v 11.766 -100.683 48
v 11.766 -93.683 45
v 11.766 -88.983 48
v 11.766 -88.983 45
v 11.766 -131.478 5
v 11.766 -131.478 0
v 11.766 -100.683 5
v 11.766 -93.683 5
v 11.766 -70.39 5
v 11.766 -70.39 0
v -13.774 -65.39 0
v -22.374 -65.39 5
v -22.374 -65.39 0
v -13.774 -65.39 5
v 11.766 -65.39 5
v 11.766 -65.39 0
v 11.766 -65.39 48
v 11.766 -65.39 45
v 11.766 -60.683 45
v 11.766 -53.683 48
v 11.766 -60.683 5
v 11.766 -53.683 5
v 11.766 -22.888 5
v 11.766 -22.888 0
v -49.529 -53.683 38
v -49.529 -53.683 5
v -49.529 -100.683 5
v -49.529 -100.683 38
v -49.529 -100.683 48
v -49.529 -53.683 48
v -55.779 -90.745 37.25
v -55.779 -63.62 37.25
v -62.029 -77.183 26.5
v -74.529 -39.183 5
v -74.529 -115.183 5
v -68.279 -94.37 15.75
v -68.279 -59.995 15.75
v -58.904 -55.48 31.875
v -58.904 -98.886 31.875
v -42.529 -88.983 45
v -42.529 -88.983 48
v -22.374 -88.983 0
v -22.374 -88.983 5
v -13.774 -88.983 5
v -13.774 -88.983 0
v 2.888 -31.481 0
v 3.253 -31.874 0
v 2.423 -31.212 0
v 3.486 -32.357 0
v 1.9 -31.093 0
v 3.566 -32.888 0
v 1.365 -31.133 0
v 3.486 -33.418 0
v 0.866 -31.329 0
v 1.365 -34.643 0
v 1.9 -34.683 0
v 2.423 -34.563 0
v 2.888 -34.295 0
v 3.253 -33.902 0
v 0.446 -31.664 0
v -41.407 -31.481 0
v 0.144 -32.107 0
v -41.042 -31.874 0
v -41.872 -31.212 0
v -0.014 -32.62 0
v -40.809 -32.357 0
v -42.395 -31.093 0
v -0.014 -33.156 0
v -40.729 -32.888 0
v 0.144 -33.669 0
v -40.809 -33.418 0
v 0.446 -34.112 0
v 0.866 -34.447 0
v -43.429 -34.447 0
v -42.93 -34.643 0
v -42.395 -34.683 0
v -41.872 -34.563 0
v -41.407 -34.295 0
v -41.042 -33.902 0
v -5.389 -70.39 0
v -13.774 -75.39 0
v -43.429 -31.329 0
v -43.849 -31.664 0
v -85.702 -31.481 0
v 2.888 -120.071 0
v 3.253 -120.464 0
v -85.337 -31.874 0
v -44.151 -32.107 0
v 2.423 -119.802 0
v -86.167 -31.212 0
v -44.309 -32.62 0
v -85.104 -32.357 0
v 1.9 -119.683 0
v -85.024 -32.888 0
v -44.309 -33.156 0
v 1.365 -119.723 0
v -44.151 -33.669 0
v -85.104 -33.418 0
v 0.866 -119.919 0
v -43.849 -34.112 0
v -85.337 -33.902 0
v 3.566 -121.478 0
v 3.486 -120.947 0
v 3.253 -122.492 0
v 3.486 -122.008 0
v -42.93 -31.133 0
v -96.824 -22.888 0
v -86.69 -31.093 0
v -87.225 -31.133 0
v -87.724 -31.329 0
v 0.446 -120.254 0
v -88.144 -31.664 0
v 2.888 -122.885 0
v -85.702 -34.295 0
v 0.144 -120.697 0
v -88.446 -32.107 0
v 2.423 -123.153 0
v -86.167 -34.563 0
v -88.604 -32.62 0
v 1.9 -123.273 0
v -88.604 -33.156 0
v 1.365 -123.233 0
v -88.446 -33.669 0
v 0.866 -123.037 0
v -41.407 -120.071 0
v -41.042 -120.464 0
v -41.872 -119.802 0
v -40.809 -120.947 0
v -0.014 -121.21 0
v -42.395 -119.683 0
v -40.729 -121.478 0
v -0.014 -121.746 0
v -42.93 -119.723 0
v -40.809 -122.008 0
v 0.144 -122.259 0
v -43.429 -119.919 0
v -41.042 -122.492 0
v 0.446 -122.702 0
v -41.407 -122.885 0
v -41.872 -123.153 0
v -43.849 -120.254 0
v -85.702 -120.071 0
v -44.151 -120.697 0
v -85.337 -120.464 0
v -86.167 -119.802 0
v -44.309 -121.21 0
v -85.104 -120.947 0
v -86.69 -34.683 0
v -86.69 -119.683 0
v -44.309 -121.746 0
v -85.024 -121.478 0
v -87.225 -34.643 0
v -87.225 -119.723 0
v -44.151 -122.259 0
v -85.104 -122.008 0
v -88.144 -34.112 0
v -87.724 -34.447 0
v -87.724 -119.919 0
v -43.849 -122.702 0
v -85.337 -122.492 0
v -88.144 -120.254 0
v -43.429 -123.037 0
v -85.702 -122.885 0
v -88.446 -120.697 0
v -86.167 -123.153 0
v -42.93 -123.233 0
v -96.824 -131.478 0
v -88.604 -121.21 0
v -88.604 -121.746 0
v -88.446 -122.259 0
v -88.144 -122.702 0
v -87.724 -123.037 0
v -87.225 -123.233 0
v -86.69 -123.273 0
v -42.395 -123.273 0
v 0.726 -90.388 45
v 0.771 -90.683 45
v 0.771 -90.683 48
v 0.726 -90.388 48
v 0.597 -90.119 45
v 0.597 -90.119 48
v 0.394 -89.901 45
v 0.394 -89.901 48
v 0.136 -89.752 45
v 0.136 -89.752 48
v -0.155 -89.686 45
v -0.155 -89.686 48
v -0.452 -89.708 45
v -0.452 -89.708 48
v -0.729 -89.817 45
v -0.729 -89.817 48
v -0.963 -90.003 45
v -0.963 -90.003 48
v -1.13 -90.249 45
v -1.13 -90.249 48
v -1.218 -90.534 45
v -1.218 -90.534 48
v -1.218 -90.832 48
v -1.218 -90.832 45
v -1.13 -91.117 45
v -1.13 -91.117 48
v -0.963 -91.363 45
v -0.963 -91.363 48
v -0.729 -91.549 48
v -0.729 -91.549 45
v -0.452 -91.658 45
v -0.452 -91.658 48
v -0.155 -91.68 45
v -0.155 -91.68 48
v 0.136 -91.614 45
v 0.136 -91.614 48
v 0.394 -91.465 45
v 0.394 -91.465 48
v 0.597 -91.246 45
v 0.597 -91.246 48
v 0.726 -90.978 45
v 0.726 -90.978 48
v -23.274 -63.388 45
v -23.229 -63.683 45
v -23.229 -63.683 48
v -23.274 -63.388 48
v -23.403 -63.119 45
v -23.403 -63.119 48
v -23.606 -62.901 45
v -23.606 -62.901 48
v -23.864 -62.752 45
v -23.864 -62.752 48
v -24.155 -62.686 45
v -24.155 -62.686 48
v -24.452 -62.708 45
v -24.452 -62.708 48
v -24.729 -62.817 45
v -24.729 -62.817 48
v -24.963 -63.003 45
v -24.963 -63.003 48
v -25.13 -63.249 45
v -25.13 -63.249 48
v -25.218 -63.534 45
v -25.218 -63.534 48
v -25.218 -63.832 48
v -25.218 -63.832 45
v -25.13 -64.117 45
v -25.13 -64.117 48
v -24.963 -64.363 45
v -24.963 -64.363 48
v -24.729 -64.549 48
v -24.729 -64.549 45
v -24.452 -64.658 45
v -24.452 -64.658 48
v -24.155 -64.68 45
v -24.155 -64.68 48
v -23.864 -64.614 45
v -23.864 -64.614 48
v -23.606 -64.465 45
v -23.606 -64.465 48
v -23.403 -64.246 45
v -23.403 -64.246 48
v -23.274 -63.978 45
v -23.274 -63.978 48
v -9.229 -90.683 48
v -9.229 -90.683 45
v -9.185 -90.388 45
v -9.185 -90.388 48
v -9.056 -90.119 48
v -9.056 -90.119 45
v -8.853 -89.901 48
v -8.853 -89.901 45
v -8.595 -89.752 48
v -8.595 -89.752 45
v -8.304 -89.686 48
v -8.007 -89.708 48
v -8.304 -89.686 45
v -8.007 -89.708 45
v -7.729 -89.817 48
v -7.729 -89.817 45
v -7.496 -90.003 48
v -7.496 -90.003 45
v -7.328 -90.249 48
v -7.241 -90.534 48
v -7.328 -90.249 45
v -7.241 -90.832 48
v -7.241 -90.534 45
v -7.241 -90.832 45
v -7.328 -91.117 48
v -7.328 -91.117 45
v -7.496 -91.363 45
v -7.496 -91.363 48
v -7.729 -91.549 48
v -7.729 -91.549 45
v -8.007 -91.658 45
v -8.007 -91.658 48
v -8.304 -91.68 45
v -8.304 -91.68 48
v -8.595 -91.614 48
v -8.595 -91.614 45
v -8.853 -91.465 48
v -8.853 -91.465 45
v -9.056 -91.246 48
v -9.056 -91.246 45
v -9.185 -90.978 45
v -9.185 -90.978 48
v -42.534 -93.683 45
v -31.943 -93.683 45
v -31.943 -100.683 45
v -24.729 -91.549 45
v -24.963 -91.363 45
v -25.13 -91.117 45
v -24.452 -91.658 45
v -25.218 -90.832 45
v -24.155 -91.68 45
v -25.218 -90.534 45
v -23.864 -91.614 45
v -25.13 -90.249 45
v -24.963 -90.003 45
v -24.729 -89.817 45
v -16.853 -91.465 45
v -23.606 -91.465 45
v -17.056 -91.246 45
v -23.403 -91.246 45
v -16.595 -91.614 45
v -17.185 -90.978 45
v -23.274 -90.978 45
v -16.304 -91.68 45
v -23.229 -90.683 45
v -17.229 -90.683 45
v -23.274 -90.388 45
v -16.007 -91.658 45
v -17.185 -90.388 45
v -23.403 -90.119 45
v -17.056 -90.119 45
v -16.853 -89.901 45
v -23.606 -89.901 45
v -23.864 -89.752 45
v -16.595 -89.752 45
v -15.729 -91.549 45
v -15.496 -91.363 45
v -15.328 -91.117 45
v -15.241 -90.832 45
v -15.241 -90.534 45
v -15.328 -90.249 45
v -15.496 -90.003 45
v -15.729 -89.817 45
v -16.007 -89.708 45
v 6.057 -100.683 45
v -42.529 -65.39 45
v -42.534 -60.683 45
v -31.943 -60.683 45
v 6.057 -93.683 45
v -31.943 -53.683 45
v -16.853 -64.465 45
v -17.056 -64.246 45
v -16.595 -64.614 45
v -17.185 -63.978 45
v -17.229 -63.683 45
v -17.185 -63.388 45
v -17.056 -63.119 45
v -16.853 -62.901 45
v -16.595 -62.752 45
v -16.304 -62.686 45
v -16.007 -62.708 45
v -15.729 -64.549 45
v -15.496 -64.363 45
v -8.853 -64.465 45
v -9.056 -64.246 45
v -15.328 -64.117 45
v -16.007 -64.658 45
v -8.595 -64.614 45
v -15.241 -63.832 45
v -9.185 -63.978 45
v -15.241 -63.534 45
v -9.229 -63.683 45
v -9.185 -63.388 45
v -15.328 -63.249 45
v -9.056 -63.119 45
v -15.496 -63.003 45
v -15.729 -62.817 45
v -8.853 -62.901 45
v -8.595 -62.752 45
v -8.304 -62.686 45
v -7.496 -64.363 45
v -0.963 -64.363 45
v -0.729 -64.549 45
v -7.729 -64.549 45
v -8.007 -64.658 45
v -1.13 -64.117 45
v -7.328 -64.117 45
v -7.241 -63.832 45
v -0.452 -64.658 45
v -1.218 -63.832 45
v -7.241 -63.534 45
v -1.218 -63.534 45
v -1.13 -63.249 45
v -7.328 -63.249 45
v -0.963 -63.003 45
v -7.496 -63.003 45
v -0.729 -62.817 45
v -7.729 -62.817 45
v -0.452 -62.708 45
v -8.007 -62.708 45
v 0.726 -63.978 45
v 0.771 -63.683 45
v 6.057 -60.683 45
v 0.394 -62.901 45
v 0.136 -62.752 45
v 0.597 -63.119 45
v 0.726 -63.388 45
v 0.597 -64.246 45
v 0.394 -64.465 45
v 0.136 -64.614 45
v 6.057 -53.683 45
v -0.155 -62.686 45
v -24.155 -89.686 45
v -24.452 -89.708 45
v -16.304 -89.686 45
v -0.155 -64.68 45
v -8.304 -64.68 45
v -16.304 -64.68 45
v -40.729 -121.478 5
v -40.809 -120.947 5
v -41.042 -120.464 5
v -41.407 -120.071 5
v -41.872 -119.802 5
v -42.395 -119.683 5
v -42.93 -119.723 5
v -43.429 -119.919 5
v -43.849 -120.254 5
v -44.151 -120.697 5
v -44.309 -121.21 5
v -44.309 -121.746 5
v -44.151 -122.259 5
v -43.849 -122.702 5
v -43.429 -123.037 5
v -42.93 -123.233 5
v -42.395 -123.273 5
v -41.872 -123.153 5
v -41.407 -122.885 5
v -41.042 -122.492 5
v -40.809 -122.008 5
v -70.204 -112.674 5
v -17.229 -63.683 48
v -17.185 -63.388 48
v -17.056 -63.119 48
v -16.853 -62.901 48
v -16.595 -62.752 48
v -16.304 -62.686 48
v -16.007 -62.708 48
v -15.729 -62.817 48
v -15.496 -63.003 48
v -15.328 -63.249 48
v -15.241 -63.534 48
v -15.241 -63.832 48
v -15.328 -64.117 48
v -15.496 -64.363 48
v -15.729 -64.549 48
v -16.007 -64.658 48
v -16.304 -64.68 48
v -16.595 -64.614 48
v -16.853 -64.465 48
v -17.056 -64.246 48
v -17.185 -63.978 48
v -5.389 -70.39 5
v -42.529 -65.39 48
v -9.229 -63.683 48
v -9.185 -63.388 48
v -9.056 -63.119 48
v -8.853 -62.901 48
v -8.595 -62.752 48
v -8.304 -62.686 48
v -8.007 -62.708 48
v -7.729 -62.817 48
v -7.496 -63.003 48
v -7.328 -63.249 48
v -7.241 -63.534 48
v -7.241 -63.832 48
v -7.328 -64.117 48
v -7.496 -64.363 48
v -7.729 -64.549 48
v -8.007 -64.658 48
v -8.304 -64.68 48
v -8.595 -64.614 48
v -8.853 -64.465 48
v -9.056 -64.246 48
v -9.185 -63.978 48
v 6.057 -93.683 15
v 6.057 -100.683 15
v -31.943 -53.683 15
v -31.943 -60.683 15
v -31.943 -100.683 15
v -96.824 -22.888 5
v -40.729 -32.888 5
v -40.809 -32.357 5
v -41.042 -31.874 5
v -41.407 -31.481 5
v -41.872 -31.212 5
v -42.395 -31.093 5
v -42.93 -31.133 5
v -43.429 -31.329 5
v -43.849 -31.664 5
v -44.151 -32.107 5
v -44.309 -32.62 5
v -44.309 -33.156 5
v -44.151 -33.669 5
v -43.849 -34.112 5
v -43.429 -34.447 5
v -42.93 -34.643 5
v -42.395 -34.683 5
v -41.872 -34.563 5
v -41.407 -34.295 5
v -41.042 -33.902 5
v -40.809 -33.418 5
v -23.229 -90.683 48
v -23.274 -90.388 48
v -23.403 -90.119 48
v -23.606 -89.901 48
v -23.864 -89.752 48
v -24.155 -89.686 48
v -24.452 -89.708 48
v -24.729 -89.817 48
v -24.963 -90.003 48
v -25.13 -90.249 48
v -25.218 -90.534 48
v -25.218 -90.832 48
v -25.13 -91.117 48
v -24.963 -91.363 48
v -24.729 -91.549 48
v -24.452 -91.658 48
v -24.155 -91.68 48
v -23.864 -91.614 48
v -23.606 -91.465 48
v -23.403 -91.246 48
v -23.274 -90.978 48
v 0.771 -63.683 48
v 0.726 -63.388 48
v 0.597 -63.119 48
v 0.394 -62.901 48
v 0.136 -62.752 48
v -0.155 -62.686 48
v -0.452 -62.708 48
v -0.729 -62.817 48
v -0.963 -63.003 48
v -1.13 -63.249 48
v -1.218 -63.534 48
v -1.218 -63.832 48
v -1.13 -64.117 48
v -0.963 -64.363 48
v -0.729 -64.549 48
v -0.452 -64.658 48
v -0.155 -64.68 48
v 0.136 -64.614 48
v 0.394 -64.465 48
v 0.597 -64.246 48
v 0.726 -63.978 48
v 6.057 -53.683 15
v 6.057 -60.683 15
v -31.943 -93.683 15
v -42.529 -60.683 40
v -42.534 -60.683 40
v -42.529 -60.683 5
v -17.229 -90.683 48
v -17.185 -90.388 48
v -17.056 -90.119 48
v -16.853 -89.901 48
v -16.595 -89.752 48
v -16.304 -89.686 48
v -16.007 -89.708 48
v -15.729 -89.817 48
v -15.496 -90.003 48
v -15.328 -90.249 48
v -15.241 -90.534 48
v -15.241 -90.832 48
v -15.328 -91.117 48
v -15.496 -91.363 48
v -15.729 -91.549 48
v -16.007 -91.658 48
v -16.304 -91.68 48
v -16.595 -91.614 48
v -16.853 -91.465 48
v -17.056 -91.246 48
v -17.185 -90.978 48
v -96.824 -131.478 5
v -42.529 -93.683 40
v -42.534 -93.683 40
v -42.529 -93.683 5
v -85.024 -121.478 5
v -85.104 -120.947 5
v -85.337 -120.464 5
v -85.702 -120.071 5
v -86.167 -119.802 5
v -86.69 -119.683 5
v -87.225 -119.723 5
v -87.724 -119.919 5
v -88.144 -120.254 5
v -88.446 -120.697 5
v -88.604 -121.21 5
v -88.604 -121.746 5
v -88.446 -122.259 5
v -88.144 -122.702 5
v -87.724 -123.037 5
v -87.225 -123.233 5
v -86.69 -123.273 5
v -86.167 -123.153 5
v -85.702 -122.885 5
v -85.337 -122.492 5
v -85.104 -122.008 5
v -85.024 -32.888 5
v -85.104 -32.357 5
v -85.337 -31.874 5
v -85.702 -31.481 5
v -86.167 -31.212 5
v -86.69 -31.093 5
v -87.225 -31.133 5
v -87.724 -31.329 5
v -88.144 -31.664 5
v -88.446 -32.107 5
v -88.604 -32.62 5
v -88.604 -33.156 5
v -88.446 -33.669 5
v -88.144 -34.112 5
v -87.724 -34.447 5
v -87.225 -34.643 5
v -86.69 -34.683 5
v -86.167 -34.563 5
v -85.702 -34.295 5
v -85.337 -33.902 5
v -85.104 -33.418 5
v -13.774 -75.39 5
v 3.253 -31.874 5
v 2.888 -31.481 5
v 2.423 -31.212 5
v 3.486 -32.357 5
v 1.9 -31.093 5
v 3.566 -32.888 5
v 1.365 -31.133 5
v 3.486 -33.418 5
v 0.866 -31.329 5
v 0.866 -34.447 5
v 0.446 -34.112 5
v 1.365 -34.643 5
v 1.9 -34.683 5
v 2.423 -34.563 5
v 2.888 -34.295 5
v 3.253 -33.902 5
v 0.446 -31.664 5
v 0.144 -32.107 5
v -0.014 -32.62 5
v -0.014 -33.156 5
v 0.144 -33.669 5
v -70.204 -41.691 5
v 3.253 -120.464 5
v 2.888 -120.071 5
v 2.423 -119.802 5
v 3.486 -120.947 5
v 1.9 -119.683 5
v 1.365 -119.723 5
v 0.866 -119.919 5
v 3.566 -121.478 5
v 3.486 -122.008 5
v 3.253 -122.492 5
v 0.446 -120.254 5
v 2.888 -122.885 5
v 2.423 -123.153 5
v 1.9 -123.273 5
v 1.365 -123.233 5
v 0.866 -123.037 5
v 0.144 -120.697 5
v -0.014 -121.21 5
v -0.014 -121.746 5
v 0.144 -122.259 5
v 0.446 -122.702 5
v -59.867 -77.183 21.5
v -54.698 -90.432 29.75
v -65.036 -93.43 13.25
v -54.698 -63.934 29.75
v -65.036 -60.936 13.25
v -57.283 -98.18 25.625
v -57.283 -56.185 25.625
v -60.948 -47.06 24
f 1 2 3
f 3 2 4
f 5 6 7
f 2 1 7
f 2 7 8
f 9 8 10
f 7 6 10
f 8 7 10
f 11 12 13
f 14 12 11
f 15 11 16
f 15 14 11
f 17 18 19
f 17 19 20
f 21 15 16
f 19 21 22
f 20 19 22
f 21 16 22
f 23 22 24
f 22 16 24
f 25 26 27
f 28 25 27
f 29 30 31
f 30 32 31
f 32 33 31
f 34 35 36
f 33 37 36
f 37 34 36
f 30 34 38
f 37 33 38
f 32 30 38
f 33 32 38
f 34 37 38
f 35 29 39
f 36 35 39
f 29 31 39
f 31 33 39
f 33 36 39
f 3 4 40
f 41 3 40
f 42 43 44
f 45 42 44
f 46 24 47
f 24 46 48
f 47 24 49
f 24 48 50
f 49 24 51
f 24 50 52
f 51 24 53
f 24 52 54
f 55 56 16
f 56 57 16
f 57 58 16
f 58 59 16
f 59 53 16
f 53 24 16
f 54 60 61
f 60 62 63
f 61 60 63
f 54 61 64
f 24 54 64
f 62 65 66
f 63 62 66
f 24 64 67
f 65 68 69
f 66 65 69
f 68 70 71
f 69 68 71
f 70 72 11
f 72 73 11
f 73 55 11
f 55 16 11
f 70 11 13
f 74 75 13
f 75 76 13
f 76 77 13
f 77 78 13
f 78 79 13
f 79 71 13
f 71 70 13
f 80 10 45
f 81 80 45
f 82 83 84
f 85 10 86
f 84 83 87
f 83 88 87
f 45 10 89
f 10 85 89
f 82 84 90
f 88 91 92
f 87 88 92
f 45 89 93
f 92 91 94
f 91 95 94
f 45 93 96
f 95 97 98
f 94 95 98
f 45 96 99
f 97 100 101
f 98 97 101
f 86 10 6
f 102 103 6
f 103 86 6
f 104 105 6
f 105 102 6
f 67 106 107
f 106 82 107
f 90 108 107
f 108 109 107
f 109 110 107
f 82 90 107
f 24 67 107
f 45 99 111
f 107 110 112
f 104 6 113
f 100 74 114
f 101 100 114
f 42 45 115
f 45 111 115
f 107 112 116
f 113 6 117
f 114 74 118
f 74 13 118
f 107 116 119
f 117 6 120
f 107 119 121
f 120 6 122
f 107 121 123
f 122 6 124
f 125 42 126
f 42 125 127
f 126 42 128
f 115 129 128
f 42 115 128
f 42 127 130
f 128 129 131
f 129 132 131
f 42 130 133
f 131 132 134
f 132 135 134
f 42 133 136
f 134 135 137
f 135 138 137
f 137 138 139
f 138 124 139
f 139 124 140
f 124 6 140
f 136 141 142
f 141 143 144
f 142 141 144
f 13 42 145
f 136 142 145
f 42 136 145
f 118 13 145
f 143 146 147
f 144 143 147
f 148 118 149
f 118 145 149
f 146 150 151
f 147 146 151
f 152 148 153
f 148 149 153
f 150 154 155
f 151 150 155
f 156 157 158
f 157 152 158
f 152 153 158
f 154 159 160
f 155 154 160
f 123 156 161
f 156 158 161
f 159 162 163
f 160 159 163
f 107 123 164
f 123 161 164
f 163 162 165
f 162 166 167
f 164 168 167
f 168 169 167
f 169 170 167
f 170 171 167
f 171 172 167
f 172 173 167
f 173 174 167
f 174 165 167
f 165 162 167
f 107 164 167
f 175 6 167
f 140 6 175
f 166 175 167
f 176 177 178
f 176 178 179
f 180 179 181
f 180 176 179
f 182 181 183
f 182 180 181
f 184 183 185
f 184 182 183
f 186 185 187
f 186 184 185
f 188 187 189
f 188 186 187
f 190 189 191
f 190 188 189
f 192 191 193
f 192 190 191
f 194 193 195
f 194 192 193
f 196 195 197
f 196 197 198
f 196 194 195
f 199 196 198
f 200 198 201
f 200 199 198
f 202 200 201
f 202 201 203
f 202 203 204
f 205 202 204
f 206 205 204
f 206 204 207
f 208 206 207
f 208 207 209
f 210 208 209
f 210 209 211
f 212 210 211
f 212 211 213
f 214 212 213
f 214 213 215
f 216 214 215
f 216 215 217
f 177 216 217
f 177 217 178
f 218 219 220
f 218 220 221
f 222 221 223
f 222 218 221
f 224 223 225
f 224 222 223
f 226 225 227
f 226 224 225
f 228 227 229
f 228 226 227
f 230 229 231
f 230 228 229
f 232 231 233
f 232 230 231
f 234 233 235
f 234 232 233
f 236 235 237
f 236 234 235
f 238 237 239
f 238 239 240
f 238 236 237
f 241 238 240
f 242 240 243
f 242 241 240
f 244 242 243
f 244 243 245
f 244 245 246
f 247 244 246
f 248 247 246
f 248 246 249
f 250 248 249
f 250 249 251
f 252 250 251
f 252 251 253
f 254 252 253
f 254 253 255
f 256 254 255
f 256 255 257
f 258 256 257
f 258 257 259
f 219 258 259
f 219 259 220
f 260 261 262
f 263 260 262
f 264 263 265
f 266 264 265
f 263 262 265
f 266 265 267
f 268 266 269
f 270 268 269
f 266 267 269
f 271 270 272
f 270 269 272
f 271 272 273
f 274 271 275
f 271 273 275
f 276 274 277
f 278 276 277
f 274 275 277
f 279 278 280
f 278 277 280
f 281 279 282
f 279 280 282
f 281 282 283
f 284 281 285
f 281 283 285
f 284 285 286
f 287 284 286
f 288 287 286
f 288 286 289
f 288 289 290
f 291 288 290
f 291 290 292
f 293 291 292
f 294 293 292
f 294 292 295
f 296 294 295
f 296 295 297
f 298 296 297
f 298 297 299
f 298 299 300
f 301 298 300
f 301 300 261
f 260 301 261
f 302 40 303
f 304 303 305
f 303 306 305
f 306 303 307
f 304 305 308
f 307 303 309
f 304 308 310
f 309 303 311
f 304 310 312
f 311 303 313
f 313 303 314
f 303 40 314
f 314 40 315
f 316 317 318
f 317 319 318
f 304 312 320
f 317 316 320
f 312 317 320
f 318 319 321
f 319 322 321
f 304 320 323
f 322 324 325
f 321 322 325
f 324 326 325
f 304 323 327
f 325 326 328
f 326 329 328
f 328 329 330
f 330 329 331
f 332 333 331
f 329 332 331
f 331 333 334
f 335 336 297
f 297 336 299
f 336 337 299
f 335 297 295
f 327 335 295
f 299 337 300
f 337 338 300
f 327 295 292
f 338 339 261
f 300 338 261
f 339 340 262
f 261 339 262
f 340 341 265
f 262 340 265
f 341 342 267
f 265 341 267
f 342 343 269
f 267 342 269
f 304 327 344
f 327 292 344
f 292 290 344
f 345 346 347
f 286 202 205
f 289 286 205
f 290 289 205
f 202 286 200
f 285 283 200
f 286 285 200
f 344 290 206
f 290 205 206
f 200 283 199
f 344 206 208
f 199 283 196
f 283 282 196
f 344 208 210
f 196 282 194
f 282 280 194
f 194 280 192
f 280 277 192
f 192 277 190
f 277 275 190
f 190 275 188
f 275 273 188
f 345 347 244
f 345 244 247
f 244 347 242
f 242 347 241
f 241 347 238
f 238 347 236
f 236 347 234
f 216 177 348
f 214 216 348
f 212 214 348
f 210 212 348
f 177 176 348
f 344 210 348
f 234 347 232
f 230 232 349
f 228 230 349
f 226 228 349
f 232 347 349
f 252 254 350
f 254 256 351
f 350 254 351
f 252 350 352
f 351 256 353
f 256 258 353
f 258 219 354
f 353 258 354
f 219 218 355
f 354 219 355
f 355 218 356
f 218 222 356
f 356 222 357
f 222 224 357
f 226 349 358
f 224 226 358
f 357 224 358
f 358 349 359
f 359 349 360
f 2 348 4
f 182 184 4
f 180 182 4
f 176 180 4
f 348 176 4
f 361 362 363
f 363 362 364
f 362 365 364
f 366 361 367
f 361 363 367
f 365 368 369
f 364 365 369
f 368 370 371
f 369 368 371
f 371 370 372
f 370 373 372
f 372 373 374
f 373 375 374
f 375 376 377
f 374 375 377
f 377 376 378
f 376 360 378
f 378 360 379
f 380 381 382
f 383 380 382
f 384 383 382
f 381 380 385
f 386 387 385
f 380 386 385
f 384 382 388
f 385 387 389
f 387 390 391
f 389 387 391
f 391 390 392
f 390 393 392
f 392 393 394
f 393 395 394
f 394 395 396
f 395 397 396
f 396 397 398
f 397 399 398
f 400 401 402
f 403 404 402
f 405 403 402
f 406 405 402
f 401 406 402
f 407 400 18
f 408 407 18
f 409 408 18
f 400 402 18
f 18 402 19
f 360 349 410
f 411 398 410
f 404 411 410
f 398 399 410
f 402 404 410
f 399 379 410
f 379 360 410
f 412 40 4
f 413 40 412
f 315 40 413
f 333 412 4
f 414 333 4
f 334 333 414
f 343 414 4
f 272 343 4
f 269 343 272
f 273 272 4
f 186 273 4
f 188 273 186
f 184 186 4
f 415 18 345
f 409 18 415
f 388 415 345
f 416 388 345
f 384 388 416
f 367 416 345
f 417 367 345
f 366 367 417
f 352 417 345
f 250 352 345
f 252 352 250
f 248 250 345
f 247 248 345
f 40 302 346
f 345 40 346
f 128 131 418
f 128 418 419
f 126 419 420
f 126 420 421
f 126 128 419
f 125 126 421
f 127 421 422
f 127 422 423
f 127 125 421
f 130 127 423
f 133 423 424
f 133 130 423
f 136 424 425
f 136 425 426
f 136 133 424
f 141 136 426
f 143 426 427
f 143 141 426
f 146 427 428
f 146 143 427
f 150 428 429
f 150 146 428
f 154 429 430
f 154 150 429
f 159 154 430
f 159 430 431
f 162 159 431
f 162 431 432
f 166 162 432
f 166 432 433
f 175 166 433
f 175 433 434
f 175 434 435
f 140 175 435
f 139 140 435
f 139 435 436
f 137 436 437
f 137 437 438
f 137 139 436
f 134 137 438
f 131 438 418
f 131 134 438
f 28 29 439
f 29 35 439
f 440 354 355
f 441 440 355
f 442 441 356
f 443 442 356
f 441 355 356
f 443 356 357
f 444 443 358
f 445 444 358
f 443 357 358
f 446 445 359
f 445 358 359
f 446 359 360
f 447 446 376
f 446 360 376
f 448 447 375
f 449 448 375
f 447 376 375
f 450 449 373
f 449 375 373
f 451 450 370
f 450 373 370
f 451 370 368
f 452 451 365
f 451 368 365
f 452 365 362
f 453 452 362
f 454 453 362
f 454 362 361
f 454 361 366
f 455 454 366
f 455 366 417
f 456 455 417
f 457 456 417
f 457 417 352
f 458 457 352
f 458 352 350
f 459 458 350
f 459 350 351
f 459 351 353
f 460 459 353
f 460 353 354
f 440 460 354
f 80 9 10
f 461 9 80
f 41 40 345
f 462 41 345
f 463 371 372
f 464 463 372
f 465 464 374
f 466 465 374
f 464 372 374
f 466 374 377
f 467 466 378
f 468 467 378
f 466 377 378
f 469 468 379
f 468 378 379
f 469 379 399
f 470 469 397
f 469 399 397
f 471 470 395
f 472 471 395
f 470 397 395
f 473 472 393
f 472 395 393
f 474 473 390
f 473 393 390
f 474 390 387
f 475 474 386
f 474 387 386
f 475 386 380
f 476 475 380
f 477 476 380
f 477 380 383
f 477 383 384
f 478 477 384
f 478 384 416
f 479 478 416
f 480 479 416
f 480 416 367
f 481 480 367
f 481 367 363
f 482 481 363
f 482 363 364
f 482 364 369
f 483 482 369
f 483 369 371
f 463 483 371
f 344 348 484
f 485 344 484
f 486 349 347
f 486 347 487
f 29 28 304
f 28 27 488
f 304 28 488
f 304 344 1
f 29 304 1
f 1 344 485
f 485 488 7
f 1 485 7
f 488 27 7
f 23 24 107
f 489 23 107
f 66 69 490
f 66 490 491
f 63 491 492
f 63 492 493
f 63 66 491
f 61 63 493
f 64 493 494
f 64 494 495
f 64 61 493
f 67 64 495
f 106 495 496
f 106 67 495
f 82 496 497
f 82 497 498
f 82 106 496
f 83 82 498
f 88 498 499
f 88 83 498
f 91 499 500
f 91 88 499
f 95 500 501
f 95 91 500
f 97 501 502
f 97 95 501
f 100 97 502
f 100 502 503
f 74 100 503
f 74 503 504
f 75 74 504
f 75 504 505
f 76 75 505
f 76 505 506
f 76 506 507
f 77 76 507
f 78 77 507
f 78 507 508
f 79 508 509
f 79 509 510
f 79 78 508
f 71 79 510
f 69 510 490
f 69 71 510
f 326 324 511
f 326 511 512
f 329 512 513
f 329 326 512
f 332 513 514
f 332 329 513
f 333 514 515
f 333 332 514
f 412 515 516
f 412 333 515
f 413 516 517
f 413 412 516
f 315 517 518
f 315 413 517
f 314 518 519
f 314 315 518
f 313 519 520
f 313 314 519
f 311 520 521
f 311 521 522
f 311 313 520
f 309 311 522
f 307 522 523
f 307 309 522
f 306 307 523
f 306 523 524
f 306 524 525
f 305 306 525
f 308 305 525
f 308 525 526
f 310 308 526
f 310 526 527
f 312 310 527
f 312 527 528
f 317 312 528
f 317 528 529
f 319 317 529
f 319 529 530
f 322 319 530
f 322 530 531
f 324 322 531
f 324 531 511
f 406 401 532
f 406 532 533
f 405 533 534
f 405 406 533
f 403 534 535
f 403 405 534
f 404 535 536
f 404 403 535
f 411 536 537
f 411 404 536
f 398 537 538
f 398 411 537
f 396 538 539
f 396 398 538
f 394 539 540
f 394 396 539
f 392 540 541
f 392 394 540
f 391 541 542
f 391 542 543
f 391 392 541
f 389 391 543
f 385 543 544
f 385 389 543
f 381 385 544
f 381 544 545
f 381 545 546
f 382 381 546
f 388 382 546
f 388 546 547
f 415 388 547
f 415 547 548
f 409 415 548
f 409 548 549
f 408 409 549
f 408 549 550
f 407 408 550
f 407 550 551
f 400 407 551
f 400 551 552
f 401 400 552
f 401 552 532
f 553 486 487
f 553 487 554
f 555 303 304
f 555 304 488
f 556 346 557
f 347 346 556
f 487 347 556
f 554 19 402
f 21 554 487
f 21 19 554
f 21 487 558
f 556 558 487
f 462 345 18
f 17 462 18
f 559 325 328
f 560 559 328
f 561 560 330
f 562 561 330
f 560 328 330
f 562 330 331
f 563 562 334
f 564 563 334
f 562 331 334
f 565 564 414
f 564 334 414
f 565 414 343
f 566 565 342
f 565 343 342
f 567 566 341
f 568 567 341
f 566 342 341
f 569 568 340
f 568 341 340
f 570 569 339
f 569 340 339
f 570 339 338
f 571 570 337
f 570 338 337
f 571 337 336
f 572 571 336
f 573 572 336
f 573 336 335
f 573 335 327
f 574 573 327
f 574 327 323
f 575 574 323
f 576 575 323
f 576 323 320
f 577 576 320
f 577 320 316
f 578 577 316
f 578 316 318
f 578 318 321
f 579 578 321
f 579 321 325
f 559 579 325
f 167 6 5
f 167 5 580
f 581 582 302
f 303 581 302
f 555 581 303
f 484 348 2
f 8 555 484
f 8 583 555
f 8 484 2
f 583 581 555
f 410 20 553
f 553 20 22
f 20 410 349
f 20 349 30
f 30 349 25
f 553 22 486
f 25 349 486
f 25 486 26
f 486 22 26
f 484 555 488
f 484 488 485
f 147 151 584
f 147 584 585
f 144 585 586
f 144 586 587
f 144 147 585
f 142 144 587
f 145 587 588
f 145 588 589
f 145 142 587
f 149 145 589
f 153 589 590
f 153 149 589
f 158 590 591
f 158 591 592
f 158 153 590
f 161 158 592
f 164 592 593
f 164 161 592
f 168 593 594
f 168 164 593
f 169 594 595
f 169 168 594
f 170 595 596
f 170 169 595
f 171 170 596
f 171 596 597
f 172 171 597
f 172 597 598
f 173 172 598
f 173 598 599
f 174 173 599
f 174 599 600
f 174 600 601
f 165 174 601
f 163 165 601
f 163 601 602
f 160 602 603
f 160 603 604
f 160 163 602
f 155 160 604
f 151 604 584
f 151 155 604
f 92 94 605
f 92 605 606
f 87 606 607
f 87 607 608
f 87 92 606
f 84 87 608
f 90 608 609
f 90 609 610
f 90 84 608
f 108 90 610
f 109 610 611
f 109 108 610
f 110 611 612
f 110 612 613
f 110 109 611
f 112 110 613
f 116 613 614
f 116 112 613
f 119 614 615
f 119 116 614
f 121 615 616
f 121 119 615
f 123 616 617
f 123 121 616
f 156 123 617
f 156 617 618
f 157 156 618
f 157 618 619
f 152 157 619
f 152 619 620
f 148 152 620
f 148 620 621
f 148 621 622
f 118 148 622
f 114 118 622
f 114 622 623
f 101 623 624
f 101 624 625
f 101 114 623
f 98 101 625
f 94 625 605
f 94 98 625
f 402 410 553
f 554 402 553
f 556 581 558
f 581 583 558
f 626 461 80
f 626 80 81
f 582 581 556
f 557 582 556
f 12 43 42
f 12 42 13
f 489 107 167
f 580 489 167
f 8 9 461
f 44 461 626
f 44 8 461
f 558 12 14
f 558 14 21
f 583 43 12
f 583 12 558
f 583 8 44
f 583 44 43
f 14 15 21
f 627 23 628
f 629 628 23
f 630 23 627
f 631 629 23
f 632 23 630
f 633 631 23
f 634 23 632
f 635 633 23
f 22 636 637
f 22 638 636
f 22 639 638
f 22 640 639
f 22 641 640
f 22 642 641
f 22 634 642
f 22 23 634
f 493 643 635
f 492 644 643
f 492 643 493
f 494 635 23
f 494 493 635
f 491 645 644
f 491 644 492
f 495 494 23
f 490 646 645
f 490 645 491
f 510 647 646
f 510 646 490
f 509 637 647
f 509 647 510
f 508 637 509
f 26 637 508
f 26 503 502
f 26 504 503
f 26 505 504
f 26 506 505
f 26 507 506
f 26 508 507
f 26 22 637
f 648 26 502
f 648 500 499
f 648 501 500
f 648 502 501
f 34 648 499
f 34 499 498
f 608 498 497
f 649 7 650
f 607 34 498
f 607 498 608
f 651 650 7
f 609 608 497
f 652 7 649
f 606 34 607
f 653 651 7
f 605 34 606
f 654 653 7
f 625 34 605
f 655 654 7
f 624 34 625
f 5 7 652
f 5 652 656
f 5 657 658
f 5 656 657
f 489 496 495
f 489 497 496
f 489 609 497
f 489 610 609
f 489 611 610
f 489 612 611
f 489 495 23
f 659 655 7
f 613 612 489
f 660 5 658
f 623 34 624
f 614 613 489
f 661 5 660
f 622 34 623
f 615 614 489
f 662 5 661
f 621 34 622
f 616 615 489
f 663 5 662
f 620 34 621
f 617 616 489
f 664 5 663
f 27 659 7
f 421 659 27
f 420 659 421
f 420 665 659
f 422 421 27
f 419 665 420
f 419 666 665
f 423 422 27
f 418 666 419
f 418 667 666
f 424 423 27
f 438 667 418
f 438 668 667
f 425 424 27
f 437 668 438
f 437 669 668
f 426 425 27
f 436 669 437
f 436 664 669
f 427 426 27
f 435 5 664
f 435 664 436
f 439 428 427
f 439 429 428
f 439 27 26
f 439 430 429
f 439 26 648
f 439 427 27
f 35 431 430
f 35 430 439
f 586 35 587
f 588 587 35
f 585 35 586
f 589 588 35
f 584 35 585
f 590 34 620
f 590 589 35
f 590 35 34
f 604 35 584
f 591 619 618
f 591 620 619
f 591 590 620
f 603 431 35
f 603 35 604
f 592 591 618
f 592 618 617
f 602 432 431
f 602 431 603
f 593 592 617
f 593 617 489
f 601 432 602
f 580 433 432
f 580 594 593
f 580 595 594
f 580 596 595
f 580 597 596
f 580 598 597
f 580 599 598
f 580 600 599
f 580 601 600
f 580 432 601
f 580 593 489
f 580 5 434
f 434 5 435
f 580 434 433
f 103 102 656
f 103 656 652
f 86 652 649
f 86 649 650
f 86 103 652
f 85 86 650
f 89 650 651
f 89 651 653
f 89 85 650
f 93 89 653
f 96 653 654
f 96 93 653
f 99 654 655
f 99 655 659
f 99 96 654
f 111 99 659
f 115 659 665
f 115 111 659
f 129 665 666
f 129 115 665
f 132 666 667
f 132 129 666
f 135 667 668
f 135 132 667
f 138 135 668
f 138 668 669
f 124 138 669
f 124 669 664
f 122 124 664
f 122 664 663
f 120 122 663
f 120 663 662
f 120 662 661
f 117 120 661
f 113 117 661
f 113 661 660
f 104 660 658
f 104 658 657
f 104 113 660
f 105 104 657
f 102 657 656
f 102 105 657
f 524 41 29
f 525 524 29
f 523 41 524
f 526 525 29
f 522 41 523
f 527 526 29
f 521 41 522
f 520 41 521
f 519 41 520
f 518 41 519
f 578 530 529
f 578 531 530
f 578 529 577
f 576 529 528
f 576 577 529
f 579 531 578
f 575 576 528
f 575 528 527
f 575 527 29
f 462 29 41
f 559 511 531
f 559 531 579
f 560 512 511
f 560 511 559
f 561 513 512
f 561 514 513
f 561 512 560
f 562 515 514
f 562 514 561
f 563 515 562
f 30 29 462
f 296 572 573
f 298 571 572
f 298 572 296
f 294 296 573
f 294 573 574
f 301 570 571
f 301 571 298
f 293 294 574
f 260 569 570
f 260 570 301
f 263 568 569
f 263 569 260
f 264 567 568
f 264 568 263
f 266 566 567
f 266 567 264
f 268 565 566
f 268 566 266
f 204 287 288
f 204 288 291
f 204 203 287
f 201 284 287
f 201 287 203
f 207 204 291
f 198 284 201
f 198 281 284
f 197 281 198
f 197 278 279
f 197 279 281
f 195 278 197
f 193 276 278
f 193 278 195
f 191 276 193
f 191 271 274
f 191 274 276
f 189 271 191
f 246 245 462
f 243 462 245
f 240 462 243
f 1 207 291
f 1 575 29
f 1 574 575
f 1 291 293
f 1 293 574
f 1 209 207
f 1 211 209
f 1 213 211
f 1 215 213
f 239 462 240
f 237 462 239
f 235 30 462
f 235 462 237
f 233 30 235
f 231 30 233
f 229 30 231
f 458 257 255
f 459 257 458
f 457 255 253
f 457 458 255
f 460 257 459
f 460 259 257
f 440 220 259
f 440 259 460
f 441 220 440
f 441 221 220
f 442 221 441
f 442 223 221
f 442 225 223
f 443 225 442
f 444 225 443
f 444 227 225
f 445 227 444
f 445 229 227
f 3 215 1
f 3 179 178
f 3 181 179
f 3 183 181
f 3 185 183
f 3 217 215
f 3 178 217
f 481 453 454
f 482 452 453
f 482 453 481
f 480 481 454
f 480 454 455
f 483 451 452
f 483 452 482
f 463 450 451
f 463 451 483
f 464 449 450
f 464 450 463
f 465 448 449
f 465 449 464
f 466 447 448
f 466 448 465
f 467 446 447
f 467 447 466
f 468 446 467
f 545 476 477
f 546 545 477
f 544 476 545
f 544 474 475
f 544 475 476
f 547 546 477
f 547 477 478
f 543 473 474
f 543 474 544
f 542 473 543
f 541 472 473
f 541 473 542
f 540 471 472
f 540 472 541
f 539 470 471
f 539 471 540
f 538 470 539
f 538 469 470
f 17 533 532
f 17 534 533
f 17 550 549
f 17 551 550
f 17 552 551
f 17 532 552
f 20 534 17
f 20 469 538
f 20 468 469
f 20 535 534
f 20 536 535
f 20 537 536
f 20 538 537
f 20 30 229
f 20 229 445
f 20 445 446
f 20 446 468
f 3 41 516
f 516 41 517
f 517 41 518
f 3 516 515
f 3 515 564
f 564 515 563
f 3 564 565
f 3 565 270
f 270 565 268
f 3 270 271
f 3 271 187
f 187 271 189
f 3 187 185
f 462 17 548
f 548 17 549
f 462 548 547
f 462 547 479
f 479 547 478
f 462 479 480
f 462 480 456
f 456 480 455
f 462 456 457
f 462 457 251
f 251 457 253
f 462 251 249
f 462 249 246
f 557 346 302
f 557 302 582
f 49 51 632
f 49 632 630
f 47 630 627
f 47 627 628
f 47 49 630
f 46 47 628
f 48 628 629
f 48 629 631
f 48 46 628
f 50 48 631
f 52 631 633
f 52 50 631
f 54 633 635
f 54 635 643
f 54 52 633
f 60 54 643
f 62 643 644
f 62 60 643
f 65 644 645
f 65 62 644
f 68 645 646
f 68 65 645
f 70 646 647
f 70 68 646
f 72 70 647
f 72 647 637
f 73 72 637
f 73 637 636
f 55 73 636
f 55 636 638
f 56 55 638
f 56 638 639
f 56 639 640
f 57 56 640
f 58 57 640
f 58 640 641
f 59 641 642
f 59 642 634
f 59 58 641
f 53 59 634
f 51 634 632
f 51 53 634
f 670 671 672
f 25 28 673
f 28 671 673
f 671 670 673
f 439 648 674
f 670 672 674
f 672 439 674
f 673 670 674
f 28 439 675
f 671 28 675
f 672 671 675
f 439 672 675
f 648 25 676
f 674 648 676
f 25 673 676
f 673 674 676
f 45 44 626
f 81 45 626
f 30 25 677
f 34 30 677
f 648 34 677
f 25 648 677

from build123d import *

# Parameters (mm, degrees)
ESQUISSE1_R             = 1.8
BOSS_EXTRU_1_DEPTH      = 5
BOSS_EXTRU_2_DEPTH      = 35
ESQUISSE3_R             = 1
BOSS_EXTRU_3_DEPTH      = 8
ESQUISSE4_W             = 8.59995714
ESQUISSE4_H             = 23.592650329
ENL_V_MAT_EXTRU_1_DEPTH = 5
ESQUISSE8_W             = 5
ESQUISSE8_H             = 33
ENL_V_MAT_EXTRU_2_DEPTH = 54.3
ESQUISSE9_W             = 38
ESQUISSE9_H             = 30
ENL_V_MAT_EXTRU_3_DEPTH = 134.157940401
ENL_V_MAT_EXTRU_4_DEPTH = 74.3


with BuildPart() as part:
    # Esquisse1 → Boss.-Extru.1 (new body)
    with BuildSketch(Plane(origin=(0, 0, 0), x_dir=(-1, 0, 0), z_dir=(0, 0, 1))):
        Polygon((96.824454852, 121.477817805), (96.824454852, 131.477817805), (-1.765545148, 131.477817805), (-11.765545148, 131.477817805), (-11.765545148, 22.887817805), (-1.765545148, 22.887817805), (42.529454852, 22.887817805), (86.824454852, 22.887817805), (96.824454852, 22.887817805), align=None)
        with BuildLine():
            ThreePointArc((0.034454852, 32.887817805), (-0.492752942, 31.615025599), (-1.765545148, 31.087817805))
            ThreePointArc((-1.765545148, 31.087817805), (-3.038337355, 34.160610011), (0.034454852, 32.887817805))
        make_face(mode=Mode.SUBTRACT)
        with BuildLine():
            ThreePointArc((44.329454852, 32.887817805), (43.802247058, 31.615025599), (42.529454852, 31.087817805))
            ThreePointArc((42.529454852, 31.087817805), (40.729454852, 32.887817805), (42.529454852, 34.687817805))
            ThreePointArc((42.529454852, 34.687817805), (43.802247058, 34.160610011), (44.329454852, 32.887817805))
        make_face(mode=Mode.SUBTRACT)
        with BuildLine():
            ThreePointArc((88.624454852, 32.887817805), (88.097247058, 31.615025599), (86.824454852, 31.087817805))
            ThreePointArc((86.824454852, 31.087817805), (85.551662645, 34.160610011), (88.624454852, 32.887817805))
        make_face(mode=Mode.SUBTRACT)
        with BuildLine():
            ThreePointArc((0.034454852, 121.477817805), (-3.038337355, 120.205025599), (-1.765545148, 123.277817805))
            ThreePointArc((-1.765545148, 123.277817805), (-0.492752942, 122.750610011), (0.034454852, 121.477817805))
        make_face(mode=Mode.SUBTRACT)
        with BuildLine():
            ThreePointArc((44.329454852, 121.477817805), (43.802247058, 120.205025599), (42.529454852, 119.677817805))
            ThreePointArc((42.529454852, 119.677817805), (41.256662645, 122.750610011), (44.329454852, 121.477817805))
        make_face(mode=Mode.SUBTRACT)
        with Locations((86.824454852, 121.477817805)):
            Circle(ESQUISSE1_R, mode=Mode.SUBTRACT)
    extrude(amount=BOSS_EXTRU_1_DEPTH)

    # Esquisse2 → Boss.-Extru.2 (add)
    with BuildSketch(Plane.XY.offset(5)):
        Polygon((11.765545148, -53.682817805), (-49.529454852, -53.682817805), (-49.529454852, -100.682817805), (11.765545148, -100.682817805), (11.765545148, -93.682817805), (-42.529454852, -93.682817805), (-42.529454852, -60.682817805), (11.765545148, -60.682817805), align=None)
    extrude(amount=BOSS_EXTRU_2_DEPTH)

    # Esquisse3 → Boss.-Extru.3 (add)
    with BuildSketch(Plane.XY.offset(40)):
        Polygon((-42.529454852, -65.390167476), (11.765545148, -65.390167476), (11.765545148, -53.682817805), (-49.529454852, -53.682817805), (-49.529454852, -100.682817805), (11.765545148, -100.682817805), (11.765545148, -88.982817805), (-42.529454852, -88.982817805), align=None)
        with Locations((-24.229454852, -63.682817805)):
            Circle(ESQUISSE3_R, mode=Mode.SUBTRACT)
        with BuildLine():
            ThreePointArc((-15.229454852, -63.682817805), (-16.229454852, -64.682817805), (-17.229454852, -63.682817805))
            ThreePointArc((-17.229454852, -63.682817805), (-16.229454852, -62.682817805), (-15.229454852, -63.682817805))
        make_face(mode=Mode.SUBTRACT)
        with BuildLine():
            ThreePointArc((-7.229454852, -63.682817805), (-8.229454852, -64.682817805), (-9.229454852, -63.682817805))
            ThreePointArc((-9.229454852, -63.682817805), (-8.229454852, -62.682817805), (-7.229454852, -63.682817805))
        make_face(mode=Mode.SUBTRACT)
        with Locations((-0.229454852, -63.682817805)):
            Circle(ESQUISSE3_R, mode=Mode.SUBTRACT)
        with Locations((-24.229454852, -90.682817805)):
            Circle(ESQUISSE3_R, mode=Mode.SUBTRACT)
        with BuildLine():
            ThreePointArc((-15.229454852, -90.682817805), (-16.229454852, -91.682817805), (-17.229454852, -90.682817805))
            ThreePointArc((-17.229454852, -90.682817805), (-16.229454852, -89.682817805), (-15.229454852, -90.682817805))
        make_face(mode=Mode.SUBTRACT)
        with BuildLine():
            ThreePointArc((-7.229454852, -90.682817805), (-8.229454852, -91.682817805), (-9.229454852, -90.682817805))
            ThreePointArc((-9.229454852, -90.682817805), (-8.229454852, -89.682817805), (-7.229454852, -90.682817805))
        make_face(mode=Mode.SUBTRACT)
        with Locations((-0.229454852, -90.682817805)):
            Circle(ESQUISSE3_R, mode=Mode.SUBTRACT)
    extrude(amount=BOSS_EXTRU_3_DEPTH)

    # Esquisse4 → Enlèv. mat.-Extru.1 (cut)
    with BuildSketch(Plane.XY.offset(5)):
        with Locations((-18.074099951, -77.186492641)):
            Rectangle(ESQUISSE4_W, ESQUISSE4_H)
    extrude(amount=-ENL_V_MAT_EXTRU_1_DEPTH, mode=Mode.SUBTRACT)

    # Esquisse5 → Lissage3 section 0
    with BuildSketch(Plane.ZY.offset(49.529454852)):
        with BuildLine():
            Line((48, -100.682817805), (38, -100.682817805))
            Line((38, -100.682817805), (38, -53.682817805))
            Line((38, -53.682817805), (48, -53.682817805))
            Line((48, -53.682817805), (48, -100.682817805))
        make_face()
    # Esquisse6 → Lissage3 section 1
    with BuildSketch(Plane.XY.offset(5)):
        with BuildLine():
            Line((-74.529454852, -115.182817805), (-74.529454852, -39.182817805))
            Line((-74.529454852, -39.182817805), (-70.204298905, -41.691408254))
            Line((-70.204298905, -41.691408254), (-70.204298905, -112.674227356))
            Line((-70.204298905, -112.674227356), (-74.529454852, -115.182817805))
        make_face()
    loft()

    # Esquisse8 → Enlèv. mat.-Extru.2 (cut)
    with BuildSketch(Plane(origin=(11.765545148, 0, 0), x_dir=(0, 0, -1), z_dir=(1, 0, 0))):
        with Locations((-42.5, -77.182817805)):
            Rectangle(ESQUISSE8_W, ESQUISSE8_H)
    extrude(amount=-ENL_V_MAT_EXTRU_2_DEPTH, mode=Mode.SUBTRACT)

    # Esquisse9 → Enlèv. mat.-Extru.3 (cut, through all)
    with BuildSketch(Plane(origin=(0, -53.682817805, 0), x_dir=(1, 0, 0), z_dir=(0, 1, 0))):
        with Locations((-12.943096448, -30)):
            Rectangle(ESQUISSE9_W, ESQUISSE9_H)
    extrude(amount=-ENL_V_MAT_EXTRU_3_DEPTH, mode=Mode.SUBTRACT)

    # Esquisse10 → Enlèv. mat.-Extru.4 (cut)
    with BuildSketch(Plane.XY.offset(5)):
        Polygon((-13.774121381, -65.390167476), (11.765545148, -65.390167476), (11.765545148, -70.390167476), (-5.389368853, -70.390167476), (-13.774121381, -75.390167476), align=None)
    extrude(amount=-ENL_V_MAT_EXTRU_4_DEPTH, mode=Mode.SUBTRACT)


solid = part.part
